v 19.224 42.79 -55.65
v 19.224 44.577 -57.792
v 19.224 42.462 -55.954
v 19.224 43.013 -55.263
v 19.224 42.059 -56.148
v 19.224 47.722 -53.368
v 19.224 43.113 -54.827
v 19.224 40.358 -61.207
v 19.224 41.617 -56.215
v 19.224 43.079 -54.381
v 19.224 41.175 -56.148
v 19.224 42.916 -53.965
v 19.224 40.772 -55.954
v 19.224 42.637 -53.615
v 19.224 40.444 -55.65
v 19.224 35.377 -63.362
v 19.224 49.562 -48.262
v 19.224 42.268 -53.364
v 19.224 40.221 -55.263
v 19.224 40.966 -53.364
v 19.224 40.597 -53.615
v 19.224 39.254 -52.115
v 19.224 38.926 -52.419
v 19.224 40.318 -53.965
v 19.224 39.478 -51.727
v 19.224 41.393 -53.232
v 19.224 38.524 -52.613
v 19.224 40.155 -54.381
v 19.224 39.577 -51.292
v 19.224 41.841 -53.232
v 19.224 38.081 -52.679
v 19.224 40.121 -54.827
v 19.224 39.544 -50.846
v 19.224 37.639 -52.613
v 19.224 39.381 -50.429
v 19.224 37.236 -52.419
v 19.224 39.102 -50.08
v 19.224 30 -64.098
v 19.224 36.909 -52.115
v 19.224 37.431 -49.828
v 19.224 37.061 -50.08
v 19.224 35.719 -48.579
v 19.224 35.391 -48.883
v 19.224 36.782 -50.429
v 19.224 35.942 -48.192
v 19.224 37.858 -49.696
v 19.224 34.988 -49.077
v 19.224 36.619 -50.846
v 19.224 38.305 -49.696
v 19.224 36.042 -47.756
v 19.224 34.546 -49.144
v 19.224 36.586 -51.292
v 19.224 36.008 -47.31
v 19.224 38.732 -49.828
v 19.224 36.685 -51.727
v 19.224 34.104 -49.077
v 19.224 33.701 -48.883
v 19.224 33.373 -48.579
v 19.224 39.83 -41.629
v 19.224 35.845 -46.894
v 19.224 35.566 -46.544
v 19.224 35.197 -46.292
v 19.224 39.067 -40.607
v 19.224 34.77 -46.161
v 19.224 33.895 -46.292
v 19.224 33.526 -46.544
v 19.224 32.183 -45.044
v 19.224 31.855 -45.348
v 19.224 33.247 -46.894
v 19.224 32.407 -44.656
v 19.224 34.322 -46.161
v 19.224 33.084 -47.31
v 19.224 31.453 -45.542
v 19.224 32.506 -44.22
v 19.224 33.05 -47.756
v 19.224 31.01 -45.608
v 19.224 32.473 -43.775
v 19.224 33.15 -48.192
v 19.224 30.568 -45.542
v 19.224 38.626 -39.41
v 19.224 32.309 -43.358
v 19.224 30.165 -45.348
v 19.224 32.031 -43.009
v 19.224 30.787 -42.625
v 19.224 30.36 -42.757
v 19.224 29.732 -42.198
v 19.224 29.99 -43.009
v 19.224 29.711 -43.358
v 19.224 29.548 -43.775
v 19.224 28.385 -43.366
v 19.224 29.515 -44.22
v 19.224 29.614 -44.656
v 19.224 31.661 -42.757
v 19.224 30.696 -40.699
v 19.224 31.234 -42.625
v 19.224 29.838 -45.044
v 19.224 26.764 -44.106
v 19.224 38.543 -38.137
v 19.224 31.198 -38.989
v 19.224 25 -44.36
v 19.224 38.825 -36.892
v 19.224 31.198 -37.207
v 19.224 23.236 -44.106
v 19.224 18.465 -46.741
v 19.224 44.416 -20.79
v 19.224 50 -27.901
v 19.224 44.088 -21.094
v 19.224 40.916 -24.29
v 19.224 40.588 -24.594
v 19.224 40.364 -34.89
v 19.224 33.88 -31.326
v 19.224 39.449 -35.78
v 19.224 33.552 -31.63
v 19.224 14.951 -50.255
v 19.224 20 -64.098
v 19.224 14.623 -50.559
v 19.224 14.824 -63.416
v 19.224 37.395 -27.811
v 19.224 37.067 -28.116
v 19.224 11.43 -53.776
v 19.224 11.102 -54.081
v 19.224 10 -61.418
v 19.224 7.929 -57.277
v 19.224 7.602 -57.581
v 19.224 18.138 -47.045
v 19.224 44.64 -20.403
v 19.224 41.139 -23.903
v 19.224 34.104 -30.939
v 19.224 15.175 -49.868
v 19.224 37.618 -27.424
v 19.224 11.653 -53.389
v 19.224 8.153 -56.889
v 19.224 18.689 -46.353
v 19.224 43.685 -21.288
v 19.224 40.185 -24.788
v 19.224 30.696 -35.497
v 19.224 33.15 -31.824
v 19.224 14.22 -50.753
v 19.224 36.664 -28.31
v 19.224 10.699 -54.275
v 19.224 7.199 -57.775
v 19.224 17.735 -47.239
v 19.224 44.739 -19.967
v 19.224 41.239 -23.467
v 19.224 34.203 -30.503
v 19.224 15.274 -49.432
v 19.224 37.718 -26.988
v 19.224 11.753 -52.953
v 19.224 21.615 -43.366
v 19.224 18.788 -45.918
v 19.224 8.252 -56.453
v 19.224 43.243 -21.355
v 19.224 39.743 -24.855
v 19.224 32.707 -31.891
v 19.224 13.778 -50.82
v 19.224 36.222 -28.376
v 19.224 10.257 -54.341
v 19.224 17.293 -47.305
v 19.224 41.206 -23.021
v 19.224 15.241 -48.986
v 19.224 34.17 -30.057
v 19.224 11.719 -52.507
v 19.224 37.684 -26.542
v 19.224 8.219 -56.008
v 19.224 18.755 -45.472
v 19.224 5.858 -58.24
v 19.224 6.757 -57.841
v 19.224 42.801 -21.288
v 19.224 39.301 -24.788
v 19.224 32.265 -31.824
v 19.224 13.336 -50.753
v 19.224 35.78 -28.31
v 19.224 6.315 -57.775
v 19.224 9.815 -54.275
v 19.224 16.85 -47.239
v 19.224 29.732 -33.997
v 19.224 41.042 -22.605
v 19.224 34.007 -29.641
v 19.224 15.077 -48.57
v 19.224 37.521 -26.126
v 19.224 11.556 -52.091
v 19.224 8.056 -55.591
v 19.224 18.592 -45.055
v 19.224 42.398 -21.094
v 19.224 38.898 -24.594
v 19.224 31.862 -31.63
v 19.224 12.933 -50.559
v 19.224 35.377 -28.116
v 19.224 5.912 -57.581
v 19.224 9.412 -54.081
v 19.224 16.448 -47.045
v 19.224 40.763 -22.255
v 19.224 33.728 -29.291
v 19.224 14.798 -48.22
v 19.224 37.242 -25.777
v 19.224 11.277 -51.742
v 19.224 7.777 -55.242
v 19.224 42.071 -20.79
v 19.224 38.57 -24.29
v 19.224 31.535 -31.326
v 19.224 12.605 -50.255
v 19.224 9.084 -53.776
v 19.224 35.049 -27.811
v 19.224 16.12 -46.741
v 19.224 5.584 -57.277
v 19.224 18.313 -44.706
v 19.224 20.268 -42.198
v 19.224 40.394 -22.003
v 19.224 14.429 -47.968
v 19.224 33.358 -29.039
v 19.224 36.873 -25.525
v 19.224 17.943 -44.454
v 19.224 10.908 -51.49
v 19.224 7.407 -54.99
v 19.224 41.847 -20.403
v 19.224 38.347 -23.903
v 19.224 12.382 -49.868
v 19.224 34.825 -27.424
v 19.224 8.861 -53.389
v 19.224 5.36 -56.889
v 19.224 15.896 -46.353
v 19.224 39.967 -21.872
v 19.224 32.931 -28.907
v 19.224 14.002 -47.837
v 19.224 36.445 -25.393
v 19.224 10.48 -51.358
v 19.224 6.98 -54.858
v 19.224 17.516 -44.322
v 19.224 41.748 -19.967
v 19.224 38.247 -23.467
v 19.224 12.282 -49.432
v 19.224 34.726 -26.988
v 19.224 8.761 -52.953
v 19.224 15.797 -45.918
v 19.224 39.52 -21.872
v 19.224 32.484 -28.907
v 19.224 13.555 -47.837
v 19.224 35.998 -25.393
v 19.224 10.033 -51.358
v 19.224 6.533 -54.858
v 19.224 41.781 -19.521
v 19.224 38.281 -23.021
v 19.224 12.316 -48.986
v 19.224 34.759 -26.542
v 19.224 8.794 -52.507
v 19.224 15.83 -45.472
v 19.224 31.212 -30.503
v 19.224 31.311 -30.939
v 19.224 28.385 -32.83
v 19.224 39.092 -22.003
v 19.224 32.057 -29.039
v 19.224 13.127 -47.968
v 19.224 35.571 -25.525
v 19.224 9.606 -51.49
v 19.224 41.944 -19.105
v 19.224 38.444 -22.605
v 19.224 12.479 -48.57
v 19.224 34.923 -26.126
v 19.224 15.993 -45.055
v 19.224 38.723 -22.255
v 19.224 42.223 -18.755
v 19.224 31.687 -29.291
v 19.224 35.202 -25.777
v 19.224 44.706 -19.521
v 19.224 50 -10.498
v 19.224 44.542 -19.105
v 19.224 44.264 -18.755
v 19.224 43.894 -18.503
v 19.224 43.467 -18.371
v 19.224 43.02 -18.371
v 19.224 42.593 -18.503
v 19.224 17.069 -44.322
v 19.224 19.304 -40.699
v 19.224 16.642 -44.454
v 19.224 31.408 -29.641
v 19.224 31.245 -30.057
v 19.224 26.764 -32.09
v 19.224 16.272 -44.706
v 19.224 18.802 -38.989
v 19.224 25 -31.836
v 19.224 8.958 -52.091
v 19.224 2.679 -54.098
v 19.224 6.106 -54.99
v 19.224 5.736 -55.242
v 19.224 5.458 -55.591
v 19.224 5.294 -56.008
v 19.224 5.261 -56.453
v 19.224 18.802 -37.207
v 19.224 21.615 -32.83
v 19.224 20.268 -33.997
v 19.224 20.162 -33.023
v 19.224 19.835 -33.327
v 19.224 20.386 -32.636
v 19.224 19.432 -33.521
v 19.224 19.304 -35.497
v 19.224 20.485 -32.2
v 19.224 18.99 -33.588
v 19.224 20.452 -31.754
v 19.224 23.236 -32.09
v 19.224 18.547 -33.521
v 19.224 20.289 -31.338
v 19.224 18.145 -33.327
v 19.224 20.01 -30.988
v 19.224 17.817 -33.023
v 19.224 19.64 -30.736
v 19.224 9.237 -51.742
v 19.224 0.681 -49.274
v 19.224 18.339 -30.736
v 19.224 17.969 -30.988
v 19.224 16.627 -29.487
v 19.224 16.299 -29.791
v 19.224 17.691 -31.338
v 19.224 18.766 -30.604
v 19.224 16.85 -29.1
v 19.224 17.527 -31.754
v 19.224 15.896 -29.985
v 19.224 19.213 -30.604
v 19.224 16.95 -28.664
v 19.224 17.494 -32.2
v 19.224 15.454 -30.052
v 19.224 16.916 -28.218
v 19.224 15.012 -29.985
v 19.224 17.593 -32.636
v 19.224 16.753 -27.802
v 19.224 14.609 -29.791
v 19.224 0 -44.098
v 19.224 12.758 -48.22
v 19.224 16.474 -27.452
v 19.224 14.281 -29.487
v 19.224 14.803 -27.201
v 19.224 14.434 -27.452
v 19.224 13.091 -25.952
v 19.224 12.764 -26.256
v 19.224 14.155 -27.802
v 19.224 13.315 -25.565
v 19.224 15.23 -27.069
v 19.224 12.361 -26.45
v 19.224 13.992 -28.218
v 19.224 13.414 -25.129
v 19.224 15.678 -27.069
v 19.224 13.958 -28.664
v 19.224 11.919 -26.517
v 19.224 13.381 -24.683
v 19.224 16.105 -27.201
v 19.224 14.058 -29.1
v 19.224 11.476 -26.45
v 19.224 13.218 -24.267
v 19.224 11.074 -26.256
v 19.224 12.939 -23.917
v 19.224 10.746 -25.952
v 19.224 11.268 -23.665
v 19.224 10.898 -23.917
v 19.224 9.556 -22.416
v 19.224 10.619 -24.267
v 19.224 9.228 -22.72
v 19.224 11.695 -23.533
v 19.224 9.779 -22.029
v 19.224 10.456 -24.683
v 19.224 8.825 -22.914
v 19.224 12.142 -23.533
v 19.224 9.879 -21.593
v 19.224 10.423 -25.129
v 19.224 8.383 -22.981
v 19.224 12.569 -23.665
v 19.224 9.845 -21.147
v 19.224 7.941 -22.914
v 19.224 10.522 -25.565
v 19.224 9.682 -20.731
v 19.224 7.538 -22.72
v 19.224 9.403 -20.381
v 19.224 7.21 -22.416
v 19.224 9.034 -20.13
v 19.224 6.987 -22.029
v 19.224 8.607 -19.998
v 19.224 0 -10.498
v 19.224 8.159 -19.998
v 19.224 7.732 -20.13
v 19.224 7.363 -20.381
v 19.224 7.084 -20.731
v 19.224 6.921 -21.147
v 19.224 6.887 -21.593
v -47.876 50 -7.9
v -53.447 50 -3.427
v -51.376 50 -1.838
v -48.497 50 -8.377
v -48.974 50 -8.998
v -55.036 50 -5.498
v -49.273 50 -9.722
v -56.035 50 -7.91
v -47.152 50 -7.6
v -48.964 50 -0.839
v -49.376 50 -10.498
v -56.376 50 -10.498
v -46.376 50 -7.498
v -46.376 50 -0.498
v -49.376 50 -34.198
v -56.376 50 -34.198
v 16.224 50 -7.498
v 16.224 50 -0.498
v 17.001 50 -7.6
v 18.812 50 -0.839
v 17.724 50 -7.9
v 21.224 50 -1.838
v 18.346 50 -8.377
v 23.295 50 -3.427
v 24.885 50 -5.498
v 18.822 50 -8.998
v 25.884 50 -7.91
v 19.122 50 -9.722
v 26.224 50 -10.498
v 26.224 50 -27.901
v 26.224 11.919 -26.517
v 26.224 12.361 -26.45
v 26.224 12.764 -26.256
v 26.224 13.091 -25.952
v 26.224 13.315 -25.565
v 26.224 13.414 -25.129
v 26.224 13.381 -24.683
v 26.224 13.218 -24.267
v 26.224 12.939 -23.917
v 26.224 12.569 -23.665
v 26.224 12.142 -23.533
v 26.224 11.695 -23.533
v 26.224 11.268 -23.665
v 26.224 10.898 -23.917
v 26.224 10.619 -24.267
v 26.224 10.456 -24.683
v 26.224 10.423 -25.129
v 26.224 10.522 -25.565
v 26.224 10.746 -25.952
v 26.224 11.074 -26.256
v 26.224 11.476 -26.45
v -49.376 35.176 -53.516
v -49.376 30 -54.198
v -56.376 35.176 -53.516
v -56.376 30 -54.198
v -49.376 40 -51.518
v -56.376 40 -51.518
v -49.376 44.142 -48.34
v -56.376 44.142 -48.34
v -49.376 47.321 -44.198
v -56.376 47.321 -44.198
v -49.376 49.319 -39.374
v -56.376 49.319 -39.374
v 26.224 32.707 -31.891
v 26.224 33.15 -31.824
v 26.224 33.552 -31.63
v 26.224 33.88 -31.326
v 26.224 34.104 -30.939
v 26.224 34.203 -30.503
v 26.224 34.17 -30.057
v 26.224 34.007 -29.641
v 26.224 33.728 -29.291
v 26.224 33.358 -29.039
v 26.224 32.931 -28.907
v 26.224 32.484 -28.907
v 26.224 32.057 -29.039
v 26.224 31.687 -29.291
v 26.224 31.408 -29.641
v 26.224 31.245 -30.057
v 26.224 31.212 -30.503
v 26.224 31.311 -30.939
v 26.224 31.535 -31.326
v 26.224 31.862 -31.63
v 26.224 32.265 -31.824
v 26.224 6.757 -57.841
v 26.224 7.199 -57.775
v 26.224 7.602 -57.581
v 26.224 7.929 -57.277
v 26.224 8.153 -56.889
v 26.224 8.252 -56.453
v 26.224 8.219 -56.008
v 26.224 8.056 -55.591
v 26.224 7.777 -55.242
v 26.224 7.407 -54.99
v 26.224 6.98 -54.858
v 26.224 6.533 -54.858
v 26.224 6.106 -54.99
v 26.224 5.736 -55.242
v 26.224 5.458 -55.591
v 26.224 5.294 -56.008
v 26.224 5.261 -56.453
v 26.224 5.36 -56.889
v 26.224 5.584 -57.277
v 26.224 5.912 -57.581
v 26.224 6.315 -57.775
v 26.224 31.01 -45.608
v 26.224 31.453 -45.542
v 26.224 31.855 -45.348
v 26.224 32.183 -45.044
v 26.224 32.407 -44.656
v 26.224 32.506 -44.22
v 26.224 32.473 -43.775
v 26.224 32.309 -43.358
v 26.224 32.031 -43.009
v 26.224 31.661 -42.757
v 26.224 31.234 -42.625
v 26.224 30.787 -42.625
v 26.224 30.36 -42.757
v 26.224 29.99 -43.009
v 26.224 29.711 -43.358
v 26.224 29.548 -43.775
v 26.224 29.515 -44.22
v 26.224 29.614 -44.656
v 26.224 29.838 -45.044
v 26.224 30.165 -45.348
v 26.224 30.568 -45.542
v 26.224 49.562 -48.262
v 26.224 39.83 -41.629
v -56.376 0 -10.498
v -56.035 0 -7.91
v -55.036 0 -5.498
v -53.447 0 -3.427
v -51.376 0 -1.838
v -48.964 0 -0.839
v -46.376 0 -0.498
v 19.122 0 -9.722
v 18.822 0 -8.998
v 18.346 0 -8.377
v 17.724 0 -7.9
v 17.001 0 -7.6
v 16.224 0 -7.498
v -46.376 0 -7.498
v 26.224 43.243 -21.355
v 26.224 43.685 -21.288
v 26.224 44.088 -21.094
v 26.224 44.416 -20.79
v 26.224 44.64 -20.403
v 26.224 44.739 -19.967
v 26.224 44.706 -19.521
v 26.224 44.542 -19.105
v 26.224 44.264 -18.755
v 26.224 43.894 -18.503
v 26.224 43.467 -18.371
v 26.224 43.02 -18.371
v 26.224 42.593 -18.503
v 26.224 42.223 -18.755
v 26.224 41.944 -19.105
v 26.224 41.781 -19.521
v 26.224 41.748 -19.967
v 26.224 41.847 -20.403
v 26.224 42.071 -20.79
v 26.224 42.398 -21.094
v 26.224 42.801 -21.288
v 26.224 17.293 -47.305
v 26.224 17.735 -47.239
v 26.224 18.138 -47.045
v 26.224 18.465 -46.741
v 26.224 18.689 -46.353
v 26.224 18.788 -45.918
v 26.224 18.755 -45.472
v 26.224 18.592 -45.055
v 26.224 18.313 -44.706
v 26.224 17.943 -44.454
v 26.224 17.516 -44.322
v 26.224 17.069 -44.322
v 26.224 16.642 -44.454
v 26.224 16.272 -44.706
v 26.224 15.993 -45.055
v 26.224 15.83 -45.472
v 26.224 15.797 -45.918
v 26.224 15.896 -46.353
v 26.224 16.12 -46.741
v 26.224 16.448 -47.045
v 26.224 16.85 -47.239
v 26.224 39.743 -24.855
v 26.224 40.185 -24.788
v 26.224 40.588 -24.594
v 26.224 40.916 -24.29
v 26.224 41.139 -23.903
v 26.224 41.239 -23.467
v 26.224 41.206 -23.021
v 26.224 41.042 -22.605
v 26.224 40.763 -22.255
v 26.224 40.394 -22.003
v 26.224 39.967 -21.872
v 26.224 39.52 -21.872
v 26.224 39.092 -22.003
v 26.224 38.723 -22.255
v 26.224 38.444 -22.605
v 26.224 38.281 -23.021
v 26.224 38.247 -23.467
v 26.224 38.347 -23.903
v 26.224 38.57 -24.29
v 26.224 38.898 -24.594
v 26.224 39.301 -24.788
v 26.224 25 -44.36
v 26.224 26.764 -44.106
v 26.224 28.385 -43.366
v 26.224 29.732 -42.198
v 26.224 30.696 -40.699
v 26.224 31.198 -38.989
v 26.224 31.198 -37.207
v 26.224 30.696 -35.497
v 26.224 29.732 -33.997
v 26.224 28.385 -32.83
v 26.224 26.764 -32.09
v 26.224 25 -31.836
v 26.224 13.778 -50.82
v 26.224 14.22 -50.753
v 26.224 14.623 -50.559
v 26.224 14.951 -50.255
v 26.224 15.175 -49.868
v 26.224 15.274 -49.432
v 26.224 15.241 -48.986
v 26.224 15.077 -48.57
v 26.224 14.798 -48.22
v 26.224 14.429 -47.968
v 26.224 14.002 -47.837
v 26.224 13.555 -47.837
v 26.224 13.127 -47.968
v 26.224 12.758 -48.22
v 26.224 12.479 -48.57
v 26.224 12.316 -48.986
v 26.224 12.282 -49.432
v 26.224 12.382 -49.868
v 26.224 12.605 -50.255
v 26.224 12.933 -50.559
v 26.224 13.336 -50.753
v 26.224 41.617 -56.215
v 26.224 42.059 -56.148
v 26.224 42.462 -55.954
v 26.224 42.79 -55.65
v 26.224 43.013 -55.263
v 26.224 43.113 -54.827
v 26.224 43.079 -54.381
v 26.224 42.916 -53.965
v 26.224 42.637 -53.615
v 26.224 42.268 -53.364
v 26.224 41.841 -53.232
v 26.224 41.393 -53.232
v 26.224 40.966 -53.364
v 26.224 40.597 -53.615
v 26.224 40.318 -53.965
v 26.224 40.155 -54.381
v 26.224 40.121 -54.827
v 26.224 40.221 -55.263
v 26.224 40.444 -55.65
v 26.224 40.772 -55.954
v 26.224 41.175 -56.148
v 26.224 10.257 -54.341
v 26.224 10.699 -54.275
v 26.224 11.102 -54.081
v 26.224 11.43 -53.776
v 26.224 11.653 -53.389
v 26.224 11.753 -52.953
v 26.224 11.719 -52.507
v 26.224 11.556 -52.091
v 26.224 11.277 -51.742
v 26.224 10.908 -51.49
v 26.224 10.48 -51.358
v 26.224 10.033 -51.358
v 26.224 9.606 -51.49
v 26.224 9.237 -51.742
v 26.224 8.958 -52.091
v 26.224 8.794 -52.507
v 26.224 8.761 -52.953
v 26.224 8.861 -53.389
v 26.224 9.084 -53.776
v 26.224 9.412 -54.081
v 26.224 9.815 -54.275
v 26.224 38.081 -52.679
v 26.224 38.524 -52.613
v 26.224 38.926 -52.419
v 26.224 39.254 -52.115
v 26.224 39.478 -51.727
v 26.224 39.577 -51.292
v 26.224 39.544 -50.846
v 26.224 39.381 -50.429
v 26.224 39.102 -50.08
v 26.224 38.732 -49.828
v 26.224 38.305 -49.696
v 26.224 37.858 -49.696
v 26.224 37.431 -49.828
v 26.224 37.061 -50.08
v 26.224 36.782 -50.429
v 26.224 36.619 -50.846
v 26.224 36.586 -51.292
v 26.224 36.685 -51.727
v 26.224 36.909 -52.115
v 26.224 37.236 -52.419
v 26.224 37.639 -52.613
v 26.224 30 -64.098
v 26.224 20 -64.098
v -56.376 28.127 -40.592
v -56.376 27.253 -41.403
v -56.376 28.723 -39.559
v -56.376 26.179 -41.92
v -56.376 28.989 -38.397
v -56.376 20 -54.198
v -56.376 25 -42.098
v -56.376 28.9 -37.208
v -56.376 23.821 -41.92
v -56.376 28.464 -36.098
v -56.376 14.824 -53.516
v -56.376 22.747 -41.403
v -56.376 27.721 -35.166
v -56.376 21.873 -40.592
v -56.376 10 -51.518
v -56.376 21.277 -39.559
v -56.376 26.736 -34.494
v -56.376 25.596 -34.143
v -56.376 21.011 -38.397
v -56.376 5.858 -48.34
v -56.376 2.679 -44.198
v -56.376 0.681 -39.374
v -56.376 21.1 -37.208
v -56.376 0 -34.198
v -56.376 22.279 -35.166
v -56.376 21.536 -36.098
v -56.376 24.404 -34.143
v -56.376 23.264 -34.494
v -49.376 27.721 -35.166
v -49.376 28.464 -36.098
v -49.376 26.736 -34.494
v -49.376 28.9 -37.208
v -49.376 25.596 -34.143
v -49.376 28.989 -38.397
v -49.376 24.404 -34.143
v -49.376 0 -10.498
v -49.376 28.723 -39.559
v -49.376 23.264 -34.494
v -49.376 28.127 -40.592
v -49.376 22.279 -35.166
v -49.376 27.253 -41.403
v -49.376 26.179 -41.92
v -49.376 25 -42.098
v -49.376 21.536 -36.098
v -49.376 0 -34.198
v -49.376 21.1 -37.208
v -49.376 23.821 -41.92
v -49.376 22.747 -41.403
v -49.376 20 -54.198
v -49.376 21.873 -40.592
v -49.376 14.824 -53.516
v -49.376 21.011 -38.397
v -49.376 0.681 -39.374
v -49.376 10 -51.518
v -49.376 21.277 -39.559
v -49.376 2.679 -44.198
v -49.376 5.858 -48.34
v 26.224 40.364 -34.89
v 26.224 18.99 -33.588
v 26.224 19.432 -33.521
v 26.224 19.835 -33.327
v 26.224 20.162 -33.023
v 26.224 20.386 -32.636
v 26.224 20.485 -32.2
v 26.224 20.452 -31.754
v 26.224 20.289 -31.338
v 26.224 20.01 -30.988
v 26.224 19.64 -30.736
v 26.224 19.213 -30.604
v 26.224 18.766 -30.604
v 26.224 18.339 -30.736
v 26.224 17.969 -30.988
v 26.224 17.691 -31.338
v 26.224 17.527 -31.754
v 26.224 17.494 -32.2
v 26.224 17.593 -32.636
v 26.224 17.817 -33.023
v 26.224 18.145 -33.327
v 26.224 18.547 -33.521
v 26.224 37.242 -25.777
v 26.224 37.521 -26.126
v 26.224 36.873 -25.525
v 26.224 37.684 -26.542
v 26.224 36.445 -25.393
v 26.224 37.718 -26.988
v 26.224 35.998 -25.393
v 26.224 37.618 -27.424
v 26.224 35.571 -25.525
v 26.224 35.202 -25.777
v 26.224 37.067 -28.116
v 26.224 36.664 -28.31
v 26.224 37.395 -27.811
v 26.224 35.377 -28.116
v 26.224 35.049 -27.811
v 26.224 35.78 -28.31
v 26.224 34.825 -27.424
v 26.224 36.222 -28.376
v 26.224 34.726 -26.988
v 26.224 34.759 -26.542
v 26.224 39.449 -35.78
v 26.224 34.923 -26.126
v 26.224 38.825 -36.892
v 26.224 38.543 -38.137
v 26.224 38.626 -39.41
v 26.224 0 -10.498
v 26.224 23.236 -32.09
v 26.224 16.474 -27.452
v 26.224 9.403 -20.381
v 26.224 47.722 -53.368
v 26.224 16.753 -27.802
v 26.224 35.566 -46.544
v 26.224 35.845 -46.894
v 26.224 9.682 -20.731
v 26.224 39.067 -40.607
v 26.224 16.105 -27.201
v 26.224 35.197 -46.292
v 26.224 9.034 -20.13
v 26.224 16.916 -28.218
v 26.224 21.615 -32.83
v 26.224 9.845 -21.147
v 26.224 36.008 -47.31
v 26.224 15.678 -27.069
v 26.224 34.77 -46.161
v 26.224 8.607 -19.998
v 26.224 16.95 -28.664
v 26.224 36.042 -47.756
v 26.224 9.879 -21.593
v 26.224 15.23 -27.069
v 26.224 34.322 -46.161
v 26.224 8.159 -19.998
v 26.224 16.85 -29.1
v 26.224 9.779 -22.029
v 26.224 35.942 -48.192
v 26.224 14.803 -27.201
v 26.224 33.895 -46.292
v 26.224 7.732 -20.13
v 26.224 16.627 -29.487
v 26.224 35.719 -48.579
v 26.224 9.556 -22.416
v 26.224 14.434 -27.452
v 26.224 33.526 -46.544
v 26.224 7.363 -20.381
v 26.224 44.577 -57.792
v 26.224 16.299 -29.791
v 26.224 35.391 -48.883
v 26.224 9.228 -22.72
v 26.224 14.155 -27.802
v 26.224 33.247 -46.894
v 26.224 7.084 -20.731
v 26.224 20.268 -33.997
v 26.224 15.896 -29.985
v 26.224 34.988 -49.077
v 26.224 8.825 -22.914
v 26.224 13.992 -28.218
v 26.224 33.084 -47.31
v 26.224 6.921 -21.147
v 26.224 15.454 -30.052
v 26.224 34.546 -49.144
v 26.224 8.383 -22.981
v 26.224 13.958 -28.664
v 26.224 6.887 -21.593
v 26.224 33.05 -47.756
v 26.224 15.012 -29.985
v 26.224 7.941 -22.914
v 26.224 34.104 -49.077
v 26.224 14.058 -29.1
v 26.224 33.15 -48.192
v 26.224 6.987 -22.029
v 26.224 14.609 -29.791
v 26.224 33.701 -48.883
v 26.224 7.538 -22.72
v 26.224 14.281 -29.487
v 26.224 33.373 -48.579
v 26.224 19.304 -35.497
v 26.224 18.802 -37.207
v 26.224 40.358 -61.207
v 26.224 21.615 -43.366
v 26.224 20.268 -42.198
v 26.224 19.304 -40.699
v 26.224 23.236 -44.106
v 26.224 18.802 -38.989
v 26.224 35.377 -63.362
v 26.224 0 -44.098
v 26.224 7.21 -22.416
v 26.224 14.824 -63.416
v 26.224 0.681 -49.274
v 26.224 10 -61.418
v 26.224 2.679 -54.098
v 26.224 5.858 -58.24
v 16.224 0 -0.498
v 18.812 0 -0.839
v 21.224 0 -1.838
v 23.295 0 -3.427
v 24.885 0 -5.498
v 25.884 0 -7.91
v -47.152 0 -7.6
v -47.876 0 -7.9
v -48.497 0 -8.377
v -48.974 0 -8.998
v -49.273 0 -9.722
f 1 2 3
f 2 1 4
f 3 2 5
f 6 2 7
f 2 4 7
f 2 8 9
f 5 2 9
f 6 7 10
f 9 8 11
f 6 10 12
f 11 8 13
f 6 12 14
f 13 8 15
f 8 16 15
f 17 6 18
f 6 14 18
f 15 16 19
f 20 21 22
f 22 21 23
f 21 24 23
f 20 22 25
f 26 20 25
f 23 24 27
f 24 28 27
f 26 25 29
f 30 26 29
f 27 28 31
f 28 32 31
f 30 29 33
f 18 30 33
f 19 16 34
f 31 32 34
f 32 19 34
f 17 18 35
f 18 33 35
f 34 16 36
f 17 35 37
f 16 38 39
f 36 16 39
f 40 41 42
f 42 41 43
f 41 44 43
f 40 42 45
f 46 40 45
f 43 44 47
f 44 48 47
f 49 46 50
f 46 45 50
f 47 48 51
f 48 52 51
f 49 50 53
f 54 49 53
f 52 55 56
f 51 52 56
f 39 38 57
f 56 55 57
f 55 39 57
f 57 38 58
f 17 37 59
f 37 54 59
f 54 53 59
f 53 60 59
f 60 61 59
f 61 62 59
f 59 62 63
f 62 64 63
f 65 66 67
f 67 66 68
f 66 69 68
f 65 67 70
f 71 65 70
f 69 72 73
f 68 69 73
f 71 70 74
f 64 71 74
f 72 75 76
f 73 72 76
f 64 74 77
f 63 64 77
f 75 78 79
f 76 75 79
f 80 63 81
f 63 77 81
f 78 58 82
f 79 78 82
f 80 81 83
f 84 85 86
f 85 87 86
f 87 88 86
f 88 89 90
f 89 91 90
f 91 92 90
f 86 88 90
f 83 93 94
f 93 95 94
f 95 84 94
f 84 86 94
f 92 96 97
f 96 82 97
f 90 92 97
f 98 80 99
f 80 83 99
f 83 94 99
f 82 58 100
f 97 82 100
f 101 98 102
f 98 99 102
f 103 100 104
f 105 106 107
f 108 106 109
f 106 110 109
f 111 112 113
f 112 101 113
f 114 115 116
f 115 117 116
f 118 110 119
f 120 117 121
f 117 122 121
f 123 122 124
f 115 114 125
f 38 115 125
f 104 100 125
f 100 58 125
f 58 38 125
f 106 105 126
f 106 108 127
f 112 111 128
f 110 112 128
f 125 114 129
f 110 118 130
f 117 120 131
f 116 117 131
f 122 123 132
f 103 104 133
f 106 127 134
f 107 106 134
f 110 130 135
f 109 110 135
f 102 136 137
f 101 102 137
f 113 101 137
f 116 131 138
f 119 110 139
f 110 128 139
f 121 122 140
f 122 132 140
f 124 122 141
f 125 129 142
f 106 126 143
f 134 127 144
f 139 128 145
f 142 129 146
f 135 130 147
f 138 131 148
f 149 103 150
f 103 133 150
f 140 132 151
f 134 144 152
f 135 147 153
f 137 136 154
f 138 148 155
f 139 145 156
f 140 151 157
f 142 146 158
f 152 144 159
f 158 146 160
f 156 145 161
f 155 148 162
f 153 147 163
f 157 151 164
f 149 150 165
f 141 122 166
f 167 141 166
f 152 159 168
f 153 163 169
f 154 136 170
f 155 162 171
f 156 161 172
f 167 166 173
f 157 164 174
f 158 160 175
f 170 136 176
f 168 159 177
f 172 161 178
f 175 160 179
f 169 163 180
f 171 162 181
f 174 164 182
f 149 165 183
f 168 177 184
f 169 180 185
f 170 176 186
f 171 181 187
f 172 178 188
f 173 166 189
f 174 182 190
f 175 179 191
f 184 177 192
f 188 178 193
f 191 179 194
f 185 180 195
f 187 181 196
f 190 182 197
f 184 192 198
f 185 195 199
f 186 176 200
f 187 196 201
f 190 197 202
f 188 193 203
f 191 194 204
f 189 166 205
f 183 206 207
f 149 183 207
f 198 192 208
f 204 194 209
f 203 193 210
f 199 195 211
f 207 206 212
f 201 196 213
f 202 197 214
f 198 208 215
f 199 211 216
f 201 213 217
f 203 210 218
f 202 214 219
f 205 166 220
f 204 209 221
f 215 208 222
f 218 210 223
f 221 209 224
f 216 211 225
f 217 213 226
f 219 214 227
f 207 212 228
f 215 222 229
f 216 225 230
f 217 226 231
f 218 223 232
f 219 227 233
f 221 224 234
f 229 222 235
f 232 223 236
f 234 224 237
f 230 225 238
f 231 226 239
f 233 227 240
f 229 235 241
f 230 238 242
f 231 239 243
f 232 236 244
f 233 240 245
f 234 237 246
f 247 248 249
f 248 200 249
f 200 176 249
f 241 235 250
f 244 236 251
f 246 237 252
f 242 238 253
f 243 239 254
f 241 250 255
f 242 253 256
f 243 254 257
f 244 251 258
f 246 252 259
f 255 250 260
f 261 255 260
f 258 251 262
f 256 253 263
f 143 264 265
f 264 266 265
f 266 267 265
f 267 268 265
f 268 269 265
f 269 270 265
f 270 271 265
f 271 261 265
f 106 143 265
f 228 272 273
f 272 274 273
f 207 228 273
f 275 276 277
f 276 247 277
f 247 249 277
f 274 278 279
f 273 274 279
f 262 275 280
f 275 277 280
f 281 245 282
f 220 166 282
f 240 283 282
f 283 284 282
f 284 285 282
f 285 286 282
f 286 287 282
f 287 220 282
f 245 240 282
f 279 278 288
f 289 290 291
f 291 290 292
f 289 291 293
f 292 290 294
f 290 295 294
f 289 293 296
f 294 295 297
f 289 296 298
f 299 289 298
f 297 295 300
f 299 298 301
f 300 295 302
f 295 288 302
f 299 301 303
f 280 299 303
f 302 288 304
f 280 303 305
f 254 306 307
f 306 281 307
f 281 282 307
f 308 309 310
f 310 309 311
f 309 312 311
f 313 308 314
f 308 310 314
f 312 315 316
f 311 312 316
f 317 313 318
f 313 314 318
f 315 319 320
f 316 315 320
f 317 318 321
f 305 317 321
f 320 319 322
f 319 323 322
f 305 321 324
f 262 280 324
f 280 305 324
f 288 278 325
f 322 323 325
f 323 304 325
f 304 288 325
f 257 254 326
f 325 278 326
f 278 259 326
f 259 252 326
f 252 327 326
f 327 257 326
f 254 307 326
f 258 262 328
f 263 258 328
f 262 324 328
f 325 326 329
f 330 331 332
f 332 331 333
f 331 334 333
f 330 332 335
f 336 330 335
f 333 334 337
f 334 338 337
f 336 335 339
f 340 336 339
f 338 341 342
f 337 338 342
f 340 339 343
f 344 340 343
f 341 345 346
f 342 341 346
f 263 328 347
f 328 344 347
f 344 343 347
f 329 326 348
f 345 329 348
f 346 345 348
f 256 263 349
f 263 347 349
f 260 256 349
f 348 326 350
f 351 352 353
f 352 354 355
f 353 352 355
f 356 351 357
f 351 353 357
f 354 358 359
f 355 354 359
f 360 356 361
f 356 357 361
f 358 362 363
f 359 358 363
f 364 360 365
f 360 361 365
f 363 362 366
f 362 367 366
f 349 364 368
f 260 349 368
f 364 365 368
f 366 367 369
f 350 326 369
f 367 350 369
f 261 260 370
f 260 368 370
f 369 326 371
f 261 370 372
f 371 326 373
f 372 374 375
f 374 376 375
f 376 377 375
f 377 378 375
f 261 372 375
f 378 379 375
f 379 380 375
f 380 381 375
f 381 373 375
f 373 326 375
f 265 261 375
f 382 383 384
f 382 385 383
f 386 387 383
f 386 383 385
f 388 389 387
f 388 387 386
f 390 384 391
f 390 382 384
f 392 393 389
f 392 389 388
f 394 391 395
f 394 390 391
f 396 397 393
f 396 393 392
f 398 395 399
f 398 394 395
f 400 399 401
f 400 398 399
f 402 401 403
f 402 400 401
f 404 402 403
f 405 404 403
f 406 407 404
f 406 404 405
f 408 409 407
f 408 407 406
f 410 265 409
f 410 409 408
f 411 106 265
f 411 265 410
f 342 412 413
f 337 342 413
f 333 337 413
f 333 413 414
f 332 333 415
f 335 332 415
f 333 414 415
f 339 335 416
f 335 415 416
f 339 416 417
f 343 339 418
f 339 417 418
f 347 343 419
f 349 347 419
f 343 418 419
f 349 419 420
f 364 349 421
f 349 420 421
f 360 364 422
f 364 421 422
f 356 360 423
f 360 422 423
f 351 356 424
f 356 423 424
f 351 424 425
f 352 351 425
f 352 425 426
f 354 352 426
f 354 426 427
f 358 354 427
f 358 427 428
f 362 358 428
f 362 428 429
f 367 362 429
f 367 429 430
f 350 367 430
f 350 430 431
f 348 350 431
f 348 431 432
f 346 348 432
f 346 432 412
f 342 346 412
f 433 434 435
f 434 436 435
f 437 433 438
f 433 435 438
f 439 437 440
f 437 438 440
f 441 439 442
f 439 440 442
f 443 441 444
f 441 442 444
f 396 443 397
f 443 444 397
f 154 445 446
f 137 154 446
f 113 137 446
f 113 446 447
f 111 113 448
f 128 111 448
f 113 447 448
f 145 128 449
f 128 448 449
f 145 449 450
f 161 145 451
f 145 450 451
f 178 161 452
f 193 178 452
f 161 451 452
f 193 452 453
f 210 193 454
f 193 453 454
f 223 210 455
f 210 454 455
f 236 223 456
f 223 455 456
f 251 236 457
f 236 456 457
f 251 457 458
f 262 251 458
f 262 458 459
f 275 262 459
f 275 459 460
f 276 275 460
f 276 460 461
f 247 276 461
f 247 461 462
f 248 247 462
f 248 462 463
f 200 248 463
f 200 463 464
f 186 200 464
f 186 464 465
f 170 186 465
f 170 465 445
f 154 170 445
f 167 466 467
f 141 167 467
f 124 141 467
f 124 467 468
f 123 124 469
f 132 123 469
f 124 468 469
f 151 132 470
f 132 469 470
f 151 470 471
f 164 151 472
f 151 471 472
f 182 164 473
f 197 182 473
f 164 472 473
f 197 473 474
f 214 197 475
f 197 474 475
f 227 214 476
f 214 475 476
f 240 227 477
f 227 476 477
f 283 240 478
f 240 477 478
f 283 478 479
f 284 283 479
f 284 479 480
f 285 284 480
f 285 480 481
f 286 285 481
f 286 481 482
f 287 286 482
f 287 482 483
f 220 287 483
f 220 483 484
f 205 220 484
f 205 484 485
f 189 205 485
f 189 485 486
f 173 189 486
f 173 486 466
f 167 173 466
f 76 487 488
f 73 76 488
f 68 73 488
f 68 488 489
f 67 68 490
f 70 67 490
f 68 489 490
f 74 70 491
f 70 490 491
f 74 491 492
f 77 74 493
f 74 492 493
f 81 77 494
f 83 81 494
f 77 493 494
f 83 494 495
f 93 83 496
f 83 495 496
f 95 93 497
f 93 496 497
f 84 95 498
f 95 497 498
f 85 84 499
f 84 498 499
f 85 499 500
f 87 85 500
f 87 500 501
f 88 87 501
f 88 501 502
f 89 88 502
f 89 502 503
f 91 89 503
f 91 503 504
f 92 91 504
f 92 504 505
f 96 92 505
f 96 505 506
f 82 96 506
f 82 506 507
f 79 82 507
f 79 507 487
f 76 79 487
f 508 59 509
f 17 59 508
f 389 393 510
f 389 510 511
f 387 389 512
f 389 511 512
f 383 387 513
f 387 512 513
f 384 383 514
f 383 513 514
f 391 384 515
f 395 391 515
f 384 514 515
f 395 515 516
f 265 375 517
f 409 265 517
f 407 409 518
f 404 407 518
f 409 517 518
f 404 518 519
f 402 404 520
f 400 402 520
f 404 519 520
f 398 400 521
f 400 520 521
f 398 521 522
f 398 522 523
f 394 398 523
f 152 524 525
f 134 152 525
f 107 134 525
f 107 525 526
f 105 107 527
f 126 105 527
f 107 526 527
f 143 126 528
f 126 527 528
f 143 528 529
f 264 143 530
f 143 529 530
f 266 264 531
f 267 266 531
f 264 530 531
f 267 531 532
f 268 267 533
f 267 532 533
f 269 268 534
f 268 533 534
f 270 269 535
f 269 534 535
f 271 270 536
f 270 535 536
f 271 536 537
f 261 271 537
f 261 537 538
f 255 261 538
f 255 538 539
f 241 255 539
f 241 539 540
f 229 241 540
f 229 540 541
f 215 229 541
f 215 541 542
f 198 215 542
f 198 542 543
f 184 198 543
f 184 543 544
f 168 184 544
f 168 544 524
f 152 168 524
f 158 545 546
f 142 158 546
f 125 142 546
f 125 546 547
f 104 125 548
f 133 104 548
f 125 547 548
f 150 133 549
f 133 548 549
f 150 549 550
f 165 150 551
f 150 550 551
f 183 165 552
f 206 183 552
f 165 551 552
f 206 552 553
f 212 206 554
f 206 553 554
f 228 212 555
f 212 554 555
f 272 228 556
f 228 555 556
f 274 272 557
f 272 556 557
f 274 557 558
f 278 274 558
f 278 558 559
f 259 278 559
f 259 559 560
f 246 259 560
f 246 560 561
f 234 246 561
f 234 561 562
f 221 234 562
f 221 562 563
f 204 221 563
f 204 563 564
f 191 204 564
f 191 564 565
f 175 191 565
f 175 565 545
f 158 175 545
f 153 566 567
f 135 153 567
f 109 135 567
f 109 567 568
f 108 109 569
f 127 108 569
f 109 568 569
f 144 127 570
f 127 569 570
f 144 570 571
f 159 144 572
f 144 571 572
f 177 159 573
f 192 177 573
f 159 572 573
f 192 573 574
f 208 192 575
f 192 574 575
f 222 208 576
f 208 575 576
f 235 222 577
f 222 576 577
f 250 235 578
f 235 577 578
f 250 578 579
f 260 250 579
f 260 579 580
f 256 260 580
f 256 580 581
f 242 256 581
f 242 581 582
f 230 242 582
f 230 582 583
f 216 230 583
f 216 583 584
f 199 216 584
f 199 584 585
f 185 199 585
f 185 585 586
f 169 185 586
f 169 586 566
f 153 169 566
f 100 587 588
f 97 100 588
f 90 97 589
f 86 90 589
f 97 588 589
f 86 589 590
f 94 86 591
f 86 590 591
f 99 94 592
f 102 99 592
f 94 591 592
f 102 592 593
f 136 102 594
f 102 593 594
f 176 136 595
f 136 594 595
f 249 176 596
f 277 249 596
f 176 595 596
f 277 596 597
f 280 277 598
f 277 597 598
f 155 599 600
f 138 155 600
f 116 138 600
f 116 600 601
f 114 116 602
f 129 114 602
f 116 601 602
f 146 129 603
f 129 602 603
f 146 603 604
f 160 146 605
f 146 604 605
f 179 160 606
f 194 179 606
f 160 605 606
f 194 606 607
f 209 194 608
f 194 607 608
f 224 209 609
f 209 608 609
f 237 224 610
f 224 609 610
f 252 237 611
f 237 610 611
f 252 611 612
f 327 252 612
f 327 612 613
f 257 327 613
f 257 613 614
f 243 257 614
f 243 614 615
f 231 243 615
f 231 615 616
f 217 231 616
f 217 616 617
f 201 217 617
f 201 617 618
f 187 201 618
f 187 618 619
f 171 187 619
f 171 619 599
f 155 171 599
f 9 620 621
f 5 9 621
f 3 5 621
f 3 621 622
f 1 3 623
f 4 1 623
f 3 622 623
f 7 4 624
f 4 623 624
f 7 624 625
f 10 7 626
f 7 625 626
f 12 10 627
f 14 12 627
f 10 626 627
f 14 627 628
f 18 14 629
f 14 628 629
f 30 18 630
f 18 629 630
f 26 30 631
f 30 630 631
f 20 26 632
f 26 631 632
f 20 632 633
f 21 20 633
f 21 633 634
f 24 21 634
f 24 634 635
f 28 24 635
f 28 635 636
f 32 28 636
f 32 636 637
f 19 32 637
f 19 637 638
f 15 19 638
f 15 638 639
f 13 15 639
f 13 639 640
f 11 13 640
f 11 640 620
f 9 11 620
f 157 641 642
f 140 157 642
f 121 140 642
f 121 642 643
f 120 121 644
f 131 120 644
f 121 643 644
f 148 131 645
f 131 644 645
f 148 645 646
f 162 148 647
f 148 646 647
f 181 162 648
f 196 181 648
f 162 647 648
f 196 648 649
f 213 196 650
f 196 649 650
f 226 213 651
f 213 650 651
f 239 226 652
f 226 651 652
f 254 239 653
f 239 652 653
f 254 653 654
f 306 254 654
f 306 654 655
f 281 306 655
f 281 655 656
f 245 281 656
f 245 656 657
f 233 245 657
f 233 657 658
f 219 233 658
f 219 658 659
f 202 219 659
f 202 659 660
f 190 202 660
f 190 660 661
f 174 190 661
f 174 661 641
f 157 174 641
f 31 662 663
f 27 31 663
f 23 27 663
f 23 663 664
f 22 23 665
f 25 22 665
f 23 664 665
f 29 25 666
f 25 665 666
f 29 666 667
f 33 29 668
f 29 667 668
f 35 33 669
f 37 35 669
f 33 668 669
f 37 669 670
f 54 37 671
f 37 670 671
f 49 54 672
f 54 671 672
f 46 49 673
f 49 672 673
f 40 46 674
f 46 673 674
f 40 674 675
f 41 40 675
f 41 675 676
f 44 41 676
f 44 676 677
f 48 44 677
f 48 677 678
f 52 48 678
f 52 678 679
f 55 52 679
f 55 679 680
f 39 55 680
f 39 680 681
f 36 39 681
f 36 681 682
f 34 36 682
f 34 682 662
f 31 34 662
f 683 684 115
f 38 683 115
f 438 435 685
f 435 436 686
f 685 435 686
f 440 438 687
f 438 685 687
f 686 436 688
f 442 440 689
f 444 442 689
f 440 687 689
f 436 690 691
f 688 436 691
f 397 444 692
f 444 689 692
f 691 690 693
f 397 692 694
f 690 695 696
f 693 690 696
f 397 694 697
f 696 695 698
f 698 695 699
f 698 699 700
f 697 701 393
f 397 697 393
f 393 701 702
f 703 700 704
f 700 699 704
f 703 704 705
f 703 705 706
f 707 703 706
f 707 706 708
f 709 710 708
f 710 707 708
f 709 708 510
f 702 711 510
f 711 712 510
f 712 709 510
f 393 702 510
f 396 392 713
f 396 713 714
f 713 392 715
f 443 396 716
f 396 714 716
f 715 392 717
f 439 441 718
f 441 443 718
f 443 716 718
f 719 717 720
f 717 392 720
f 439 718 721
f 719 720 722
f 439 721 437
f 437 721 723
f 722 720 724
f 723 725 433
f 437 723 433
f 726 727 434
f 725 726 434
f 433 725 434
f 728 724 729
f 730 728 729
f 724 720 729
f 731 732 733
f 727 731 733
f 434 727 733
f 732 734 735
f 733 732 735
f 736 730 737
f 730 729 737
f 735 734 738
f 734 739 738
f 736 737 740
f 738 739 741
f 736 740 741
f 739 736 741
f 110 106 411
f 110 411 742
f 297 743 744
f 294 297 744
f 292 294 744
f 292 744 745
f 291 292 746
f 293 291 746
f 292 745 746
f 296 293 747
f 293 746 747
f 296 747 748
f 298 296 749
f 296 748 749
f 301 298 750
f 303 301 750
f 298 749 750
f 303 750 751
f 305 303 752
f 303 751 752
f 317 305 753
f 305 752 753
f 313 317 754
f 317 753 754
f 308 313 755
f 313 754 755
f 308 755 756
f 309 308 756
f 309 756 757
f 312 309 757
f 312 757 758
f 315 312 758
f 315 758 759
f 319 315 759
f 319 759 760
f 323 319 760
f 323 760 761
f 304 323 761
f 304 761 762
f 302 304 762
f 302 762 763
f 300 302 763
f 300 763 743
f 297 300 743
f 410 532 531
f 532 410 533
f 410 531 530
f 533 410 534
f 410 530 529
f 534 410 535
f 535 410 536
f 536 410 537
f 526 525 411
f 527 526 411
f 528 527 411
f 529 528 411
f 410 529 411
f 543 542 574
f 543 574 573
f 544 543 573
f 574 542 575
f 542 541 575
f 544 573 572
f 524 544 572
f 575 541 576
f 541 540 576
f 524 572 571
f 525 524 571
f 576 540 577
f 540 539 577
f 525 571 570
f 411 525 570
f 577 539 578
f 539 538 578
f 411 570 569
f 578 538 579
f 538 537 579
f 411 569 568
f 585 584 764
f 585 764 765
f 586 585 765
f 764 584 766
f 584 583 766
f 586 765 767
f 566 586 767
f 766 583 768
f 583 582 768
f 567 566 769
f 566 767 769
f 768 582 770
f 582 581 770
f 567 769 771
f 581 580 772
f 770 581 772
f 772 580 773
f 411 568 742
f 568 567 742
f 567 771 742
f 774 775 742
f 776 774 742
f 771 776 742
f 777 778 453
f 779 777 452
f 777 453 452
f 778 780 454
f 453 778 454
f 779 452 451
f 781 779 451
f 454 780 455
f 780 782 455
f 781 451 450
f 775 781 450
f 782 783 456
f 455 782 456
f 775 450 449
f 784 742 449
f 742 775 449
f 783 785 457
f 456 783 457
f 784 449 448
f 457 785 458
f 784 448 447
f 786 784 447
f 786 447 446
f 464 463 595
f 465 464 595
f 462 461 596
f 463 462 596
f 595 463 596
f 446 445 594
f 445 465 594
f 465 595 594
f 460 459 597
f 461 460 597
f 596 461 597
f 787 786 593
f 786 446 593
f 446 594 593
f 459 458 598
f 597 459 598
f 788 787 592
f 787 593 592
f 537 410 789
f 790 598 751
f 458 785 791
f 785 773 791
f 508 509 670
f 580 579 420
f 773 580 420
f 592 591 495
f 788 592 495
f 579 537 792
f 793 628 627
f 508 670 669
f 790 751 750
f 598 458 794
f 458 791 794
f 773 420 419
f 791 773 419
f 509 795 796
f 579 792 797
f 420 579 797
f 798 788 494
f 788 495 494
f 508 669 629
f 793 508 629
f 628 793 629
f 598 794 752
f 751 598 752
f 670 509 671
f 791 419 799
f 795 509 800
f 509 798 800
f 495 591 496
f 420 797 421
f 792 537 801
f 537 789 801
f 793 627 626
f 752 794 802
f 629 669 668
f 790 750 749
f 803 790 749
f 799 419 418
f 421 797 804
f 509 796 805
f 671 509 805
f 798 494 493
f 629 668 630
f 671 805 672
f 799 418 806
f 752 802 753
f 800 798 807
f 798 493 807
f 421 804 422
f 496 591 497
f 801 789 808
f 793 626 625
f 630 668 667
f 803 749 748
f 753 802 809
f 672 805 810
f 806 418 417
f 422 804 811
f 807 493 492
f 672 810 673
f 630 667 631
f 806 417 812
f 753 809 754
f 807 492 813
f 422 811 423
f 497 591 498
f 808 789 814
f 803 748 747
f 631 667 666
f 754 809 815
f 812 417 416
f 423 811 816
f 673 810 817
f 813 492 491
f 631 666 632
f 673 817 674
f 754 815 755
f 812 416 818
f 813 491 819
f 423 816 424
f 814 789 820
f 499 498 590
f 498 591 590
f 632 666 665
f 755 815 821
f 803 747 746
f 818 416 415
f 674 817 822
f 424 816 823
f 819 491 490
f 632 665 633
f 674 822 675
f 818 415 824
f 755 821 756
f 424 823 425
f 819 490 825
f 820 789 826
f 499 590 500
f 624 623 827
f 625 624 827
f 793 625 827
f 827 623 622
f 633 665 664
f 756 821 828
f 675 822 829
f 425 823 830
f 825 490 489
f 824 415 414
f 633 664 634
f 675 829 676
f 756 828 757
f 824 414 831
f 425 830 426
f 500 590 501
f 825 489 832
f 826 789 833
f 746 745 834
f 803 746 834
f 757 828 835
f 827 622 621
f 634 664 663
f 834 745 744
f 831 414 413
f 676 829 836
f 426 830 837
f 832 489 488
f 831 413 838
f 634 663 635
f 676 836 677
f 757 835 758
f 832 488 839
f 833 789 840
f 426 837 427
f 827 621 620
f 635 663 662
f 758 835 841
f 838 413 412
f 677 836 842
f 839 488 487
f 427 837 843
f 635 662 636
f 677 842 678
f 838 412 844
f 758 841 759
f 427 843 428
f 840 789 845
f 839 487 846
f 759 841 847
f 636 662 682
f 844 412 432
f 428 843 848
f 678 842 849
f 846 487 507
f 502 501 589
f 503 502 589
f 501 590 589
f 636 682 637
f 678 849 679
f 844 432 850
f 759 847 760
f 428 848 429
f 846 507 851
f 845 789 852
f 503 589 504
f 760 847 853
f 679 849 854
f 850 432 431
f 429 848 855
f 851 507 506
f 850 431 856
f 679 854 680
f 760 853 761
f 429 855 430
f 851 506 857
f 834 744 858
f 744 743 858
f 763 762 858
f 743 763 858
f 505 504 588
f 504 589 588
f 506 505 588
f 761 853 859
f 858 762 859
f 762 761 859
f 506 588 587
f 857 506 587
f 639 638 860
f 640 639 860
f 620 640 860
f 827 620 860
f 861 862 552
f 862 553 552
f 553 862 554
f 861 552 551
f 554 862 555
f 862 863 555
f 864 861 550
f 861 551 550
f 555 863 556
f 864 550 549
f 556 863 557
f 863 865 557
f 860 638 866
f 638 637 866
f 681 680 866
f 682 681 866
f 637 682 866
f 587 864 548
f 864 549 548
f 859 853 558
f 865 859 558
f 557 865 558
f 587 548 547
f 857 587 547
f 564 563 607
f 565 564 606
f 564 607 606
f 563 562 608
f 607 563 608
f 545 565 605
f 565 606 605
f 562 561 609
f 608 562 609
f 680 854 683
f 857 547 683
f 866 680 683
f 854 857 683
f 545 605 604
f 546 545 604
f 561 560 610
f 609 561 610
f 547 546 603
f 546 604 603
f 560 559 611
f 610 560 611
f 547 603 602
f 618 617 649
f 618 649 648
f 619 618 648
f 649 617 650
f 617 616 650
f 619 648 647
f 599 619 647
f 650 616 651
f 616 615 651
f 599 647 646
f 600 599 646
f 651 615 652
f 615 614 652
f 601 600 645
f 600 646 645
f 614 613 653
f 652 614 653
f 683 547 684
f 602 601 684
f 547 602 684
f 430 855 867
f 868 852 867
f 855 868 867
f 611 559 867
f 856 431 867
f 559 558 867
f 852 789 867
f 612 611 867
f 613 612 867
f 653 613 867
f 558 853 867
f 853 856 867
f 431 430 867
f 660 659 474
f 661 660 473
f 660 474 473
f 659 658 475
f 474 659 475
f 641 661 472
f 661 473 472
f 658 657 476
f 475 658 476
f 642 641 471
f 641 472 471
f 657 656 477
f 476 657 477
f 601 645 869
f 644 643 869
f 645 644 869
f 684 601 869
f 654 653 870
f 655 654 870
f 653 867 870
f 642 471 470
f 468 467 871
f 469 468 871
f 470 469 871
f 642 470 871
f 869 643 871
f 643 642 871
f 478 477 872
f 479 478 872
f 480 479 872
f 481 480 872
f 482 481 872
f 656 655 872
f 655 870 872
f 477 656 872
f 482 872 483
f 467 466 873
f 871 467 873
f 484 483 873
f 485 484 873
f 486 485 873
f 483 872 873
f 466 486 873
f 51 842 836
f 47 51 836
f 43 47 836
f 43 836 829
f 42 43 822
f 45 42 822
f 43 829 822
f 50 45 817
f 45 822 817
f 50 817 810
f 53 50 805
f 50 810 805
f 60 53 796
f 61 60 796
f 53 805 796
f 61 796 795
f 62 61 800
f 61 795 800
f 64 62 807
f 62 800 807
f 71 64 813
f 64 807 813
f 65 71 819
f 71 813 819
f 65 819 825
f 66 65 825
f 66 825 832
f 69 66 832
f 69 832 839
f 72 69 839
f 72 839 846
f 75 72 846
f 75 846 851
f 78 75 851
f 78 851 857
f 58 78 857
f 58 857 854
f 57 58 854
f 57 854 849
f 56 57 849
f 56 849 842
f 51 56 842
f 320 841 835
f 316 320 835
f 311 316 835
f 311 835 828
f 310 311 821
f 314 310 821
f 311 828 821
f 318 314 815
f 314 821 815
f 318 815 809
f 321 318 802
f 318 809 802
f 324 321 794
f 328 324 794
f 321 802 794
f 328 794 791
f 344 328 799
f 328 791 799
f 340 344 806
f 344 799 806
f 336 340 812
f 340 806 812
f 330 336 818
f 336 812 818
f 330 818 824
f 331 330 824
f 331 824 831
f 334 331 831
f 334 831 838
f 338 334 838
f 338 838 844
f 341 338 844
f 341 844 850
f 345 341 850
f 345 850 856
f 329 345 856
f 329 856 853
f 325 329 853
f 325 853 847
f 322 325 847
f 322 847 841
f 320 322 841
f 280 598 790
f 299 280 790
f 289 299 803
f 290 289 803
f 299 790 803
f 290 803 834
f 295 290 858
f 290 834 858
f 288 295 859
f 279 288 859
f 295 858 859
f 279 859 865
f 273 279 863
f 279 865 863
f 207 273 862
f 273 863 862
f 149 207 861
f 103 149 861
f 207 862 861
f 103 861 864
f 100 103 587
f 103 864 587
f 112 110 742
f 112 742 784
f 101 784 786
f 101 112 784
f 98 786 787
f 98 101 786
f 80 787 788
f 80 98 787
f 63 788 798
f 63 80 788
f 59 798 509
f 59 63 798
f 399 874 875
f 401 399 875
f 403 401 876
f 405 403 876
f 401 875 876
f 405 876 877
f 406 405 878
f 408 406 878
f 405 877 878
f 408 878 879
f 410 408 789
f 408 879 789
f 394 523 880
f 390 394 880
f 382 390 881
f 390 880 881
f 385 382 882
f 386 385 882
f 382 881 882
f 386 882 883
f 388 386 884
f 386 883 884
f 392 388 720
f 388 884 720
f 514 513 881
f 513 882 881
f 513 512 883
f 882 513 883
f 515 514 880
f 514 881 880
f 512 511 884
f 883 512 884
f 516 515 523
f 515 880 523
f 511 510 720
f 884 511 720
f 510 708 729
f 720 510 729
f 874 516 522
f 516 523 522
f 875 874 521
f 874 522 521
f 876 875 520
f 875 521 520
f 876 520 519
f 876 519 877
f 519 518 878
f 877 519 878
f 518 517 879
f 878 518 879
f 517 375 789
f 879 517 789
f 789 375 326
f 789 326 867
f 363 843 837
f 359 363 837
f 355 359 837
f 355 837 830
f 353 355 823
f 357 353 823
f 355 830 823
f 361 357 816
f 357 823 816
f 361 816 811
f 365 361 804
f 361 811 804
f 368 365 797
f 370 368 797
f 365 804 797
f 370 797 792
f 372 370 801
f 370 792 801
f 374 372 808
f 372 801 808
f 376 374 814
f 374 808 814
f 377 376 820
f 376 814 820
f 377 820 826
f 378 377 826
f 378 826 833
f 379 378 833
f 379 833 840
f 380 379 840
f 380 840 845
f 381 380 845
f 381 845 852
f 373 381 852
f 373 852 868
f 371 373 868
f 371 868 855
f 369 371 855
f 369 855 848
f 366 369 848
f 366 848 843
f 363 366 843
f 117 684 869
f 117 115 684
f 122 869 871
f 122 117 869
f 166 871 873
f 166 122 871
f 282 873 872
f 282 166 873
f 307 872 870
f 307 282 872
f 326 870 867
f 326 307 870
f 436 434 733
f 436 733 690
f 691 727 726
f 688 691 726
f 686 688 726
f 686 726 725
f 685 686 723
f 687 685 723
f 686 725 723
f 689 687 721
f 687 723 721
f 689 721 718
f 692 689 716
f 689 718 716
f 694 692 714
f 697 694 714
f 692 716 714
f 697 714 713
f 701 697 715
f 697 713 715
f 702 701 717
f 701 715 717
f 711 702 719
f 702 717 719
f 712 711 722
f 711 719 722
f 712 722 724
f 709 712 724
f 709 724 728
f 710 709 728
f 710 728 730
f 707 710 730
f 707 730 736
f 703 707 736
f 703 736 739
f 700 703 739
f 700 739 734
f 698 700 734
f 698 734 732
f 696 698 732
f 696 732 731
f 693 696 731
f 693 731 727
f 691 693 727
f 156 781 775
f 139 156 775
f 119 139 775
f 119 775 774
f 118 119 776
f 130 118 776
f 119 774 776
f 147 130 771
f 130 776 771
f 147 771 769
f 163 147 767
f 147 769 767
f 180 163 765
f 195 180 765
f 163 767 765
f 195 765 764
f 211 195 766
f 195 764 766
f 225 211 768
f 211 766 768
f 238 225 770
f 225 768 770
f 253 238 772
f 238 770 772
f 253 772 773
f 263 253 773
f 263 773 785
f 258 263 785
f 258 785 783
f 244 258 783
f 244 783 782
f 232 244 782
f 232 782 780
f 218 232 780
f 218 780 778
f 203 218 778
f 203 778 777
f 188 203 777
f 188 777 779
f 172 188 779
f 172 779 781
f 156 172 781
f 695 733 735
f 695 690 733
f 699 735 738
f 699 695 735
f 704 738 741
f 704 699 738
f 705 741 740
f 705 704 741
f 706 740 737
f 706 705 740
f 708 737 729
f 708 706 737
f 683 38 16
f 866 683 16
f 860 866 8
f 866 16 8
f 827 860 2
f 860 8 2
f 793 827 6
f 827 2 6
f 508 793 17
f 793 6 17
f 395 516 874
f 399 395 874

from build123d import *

# Parameters (mm, degrees)
BOSS_EXTRUDE1_DEPTH     = 50
FILLET2_R               = 20
SKETCH6_R               = 6.261637428
SKETCH6_R_2             = 1.5
CUT_EXTRUDE2_DEPTH      = 28.4
SKETCH6_3_R             = 4
CUT_EXTRUDE3_DEPTH      = 136.4
CUT_EXTRUDE4_DEPTH      = 116.893533958
CUT_EXTRUDE4_DEPTH_BACK = 26.4


with BuildPart() as part:
    # Sketch1 → Boss-Extrude1 (new body)
    with BuildSketch(Plane(origin=(0, 0, 0), x_dir=(1, 0, 0), z_dir=(0, 1, 0))):
        with BuildLine():
            Line((-56.375697839, 54.197981352), (-56.375697839, 10.497981352))
            ThreePointArc((-56.375697839, 10.497981352), (-53.44676565, 3.42691354), (-46.375697839, 0.497981352))
            Line((-46.375697839, 0.497981352), (16.224302161, 0.497981352))
            ThreePointArc((16.224302161, 0.497981352), (23.295369973, 3.42691354), (26.224302161, 10.497981352))
            Line((26.224302161, 10.497981352), (26.224302161, 64.097981352))
            Line((26.224302161, 64.097981352), (19.224302161, 64.097981352))
            Line((19.224302161, 64.097981352), (19.224302161, 10.497981352))
            ThreePointArc((19.224302161, 10.497981352), (18.345622505, 8.376661008), (16.224302161, 7.497981352))
            Line((16.224302161, 7.497981352), (-46.375697839, 7.497981352))
            ThreePointArc((-46.375697839, 7.497981352), (-48.497018182, 8.376661008), (-49.375697839, 10.497981352))
            Line((-49.375697839, 10.497981352), (-49.375697839, 54.197981352))
            Line((-49.375697839, 54.197981352), (-56.375697839, 54.197981352))
        make_face()
    extrude(amount=BOSS_EXTRUDE1_DEPTH)

    # Fillet2
    fillet2_edges = [part.edges().sort_by_distance(p)[0] for p in [
        (-52.875697839, 50, -54.197981352),
        (-52.875697839, 0, -54.197981352),
        (22.724302161, 0, -64.097981352),
        (22.724302161, 50, -64.097981352),
    ]]
    fillet(fillet2_edges, radius=FILLET2_R)

    # Sketch6 → Cut-Extrude2 (cut)
    with BuildSketch(Plane(origin=(26.224302161, 0, 0), x_dir=(0, 0, -1), z_dir=(1, 0, 0))):
        with Locations((38.097981352, 25)):
            Circle(SKETCH6_R)
        with Locations((19.854626397, 43.243354955)):
            Circle(SKETCH6_R_2)
        with Locations((23.354804964, 39.743176388)):
            Circle(SKETCH6_R_2)
        with Locations((26.876196734, 36.221784617)):
            Circle(SKETCH6_R_2)
        with Locations((30.390517437, 32.707463915)):
            Circle(SKETCH6_R_2)
        with Locations((32.087573711, 18.98959236)):
            Circle(SKETCH6_R_2)
        with Locations((28.552039805, 15.454058454)):
            Circle(SKETCH6_R_2)
        with Locations((25.0165059, 11.918524548)):
            Circle(SKETCH6_R_2)
        with Locations((21.480971994, 8.382990642)):
            Circle(SKETCH6_R_2)
        with Locations((44.108388992, 31.01040764)):
            Circle(SKETCH6_R_2)
        with Locations((47.643922898, 34.545941546)):
            Circle(SKETCH6_R_2)
        with Locations((51.179456803, 38.081475452)):
            Circle(SKETCH6_R_2)
        with Locations((54.714990709, 41.617009358)):
            Circle(SKETCH6_R_2)
        with Locations((56.341336306, 6.756645045)):
            Circle(SKETCH6_R_2)
        with Locations((52.841157739, 10.256823612)):
            Circle(SKETCH6_R_2)
        with Locations((49.319765969, 13.778215383)):
            Circle(SKETCH6_R_2)
        with Locations((45.805445266, 17.292536085)):
            Circle(SKETCH6_R_2)
    extrude(amount=-CUT_EXTRUDE2_DEPTH, mode=Mode.SUBTRACT)

    # Sketch6<3> → Cut-Extrude3 (cut)
    with BuildSketch(Plane(origin=(26.224302161, 0, 0), x_dir=(0, 0, -1), z_dir=(1, 0, 0))):
        with Locations((38.097981352, 25)):
            Circle(SKETCH6_3_R)
    extrude(amount=-CUT_EXTRUDE3_DEPTH, mode=Mode.SUBTRACT)

    # Sketch7 → Cut-Extrude4 (cut, two sides: drawn at the far end of the back side and taken through both)
    with BuildSketch(Plane(origin=(26.224302161, 0, 0), x_dir=(0, 0, -1), z_dir=(1, 0, 0)).offset(-CUT_EXTRUDE4_DEPTH_BACK)):
        with BuildLine():
            Line((44.097981352, 50), (27.901409821, 50))
            Line((27.901409821, 50), (34.889942889, 40.363586132))
            ThreePointArc((34.889942889, 40.363586132), (38.136702541, 38.542544558), (41.629478365, 39.830239282))
            Line((41.629478365, 39.830239282), (48.26230961, 49.561655609))
            ThreePointArc((48.26230961, 49.561655609), (46.191648926, 49.890112018), (44.097981352, 50))
        make_face()
    extrude(amount=CUT_EXTRUDE4_DEPTH + CUT_EXTRUDE4_DEPTH_BACK, mode=Mode.SUBTRACT)


solid = part.part
